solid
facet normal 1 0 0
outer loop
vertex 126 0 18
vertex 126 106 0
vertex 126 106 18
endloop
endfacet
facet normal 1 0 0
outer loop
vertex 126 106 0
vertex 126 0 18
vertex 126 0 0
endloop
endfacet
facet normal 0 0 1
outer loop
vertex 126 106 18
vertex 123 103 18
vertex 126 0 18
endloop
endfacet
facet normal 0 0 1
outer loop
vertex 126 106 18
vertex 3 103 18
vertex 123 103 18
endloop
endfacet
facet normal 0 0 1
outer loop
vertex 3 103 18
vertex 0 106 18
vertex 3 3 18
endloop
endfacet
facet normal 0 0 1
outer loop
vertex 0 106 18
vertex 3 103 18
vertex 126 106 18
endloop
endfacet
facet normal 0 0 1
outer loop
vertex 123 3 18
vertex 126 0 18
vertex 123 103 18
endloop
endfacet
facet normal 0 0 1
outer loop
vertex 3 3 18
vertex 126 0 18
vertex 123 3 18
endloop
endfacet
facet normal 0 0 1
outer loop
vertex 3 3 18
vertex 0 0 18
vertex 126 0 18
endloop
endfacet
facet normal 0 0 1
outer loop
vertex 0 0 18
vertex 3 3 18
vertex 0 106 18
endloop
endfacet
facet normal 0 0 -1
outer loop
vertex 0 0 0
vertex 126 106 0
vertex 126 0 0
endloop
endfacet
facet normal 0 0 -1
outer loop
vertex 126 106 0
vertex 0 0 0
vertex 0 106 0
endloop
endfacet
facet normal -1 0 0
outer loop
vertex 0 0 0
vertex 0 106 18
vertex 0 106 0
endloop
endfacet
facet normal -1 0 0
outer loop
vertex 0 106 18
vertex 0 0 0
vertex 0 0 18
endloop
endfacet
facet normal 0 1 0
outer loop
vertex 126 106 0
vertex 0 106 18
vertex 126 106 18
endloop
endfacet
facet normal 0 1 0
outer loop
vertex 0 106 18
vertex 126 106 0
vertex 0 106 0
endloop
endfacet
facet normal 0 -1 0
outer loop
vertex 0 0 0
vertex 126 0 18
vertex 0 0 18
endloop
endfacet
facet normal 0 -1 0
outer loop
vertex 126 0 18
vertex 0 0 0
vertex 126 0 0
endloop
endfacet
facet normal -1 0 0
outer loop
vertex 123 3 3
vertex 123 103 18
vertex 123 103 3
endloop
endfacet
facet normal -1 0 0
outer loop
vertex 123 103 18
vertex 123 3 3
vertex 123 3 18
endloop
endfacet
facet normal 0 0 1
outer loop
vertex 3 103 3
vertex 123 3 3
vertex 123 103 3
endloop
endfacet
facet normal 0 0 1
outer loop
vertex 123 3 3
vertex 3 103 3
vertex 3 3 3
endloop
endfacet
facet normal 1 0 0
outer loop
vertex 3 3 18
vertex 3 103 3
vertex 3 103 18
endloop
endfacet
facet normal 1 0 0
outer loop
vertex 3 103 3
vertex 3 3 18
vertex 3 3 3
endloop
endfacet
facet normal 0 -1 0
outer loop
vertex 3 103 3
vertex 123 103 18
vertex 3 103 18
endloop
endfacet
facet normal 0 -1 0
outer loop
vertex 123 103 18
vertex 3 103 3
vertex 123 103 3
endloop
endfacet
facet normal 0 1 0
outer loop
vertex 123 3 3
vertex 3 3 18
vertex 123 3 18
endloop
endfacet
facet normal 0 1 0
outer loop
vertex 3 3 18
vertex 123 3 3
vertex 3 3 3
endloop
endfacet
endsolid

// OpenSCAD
// Four-wall cover. mm. length, width and height are INNER dimensions.
width=100;
length=120;
height=15;
base=3;
wall=3;
assert(min(width,length,height,base,wall)>=0.2);
difference() {
    cube([length+2*wall,width+2*wall,height+base]);
    translate([wall,wall,base]) cube([length,width,height+1]);
}
